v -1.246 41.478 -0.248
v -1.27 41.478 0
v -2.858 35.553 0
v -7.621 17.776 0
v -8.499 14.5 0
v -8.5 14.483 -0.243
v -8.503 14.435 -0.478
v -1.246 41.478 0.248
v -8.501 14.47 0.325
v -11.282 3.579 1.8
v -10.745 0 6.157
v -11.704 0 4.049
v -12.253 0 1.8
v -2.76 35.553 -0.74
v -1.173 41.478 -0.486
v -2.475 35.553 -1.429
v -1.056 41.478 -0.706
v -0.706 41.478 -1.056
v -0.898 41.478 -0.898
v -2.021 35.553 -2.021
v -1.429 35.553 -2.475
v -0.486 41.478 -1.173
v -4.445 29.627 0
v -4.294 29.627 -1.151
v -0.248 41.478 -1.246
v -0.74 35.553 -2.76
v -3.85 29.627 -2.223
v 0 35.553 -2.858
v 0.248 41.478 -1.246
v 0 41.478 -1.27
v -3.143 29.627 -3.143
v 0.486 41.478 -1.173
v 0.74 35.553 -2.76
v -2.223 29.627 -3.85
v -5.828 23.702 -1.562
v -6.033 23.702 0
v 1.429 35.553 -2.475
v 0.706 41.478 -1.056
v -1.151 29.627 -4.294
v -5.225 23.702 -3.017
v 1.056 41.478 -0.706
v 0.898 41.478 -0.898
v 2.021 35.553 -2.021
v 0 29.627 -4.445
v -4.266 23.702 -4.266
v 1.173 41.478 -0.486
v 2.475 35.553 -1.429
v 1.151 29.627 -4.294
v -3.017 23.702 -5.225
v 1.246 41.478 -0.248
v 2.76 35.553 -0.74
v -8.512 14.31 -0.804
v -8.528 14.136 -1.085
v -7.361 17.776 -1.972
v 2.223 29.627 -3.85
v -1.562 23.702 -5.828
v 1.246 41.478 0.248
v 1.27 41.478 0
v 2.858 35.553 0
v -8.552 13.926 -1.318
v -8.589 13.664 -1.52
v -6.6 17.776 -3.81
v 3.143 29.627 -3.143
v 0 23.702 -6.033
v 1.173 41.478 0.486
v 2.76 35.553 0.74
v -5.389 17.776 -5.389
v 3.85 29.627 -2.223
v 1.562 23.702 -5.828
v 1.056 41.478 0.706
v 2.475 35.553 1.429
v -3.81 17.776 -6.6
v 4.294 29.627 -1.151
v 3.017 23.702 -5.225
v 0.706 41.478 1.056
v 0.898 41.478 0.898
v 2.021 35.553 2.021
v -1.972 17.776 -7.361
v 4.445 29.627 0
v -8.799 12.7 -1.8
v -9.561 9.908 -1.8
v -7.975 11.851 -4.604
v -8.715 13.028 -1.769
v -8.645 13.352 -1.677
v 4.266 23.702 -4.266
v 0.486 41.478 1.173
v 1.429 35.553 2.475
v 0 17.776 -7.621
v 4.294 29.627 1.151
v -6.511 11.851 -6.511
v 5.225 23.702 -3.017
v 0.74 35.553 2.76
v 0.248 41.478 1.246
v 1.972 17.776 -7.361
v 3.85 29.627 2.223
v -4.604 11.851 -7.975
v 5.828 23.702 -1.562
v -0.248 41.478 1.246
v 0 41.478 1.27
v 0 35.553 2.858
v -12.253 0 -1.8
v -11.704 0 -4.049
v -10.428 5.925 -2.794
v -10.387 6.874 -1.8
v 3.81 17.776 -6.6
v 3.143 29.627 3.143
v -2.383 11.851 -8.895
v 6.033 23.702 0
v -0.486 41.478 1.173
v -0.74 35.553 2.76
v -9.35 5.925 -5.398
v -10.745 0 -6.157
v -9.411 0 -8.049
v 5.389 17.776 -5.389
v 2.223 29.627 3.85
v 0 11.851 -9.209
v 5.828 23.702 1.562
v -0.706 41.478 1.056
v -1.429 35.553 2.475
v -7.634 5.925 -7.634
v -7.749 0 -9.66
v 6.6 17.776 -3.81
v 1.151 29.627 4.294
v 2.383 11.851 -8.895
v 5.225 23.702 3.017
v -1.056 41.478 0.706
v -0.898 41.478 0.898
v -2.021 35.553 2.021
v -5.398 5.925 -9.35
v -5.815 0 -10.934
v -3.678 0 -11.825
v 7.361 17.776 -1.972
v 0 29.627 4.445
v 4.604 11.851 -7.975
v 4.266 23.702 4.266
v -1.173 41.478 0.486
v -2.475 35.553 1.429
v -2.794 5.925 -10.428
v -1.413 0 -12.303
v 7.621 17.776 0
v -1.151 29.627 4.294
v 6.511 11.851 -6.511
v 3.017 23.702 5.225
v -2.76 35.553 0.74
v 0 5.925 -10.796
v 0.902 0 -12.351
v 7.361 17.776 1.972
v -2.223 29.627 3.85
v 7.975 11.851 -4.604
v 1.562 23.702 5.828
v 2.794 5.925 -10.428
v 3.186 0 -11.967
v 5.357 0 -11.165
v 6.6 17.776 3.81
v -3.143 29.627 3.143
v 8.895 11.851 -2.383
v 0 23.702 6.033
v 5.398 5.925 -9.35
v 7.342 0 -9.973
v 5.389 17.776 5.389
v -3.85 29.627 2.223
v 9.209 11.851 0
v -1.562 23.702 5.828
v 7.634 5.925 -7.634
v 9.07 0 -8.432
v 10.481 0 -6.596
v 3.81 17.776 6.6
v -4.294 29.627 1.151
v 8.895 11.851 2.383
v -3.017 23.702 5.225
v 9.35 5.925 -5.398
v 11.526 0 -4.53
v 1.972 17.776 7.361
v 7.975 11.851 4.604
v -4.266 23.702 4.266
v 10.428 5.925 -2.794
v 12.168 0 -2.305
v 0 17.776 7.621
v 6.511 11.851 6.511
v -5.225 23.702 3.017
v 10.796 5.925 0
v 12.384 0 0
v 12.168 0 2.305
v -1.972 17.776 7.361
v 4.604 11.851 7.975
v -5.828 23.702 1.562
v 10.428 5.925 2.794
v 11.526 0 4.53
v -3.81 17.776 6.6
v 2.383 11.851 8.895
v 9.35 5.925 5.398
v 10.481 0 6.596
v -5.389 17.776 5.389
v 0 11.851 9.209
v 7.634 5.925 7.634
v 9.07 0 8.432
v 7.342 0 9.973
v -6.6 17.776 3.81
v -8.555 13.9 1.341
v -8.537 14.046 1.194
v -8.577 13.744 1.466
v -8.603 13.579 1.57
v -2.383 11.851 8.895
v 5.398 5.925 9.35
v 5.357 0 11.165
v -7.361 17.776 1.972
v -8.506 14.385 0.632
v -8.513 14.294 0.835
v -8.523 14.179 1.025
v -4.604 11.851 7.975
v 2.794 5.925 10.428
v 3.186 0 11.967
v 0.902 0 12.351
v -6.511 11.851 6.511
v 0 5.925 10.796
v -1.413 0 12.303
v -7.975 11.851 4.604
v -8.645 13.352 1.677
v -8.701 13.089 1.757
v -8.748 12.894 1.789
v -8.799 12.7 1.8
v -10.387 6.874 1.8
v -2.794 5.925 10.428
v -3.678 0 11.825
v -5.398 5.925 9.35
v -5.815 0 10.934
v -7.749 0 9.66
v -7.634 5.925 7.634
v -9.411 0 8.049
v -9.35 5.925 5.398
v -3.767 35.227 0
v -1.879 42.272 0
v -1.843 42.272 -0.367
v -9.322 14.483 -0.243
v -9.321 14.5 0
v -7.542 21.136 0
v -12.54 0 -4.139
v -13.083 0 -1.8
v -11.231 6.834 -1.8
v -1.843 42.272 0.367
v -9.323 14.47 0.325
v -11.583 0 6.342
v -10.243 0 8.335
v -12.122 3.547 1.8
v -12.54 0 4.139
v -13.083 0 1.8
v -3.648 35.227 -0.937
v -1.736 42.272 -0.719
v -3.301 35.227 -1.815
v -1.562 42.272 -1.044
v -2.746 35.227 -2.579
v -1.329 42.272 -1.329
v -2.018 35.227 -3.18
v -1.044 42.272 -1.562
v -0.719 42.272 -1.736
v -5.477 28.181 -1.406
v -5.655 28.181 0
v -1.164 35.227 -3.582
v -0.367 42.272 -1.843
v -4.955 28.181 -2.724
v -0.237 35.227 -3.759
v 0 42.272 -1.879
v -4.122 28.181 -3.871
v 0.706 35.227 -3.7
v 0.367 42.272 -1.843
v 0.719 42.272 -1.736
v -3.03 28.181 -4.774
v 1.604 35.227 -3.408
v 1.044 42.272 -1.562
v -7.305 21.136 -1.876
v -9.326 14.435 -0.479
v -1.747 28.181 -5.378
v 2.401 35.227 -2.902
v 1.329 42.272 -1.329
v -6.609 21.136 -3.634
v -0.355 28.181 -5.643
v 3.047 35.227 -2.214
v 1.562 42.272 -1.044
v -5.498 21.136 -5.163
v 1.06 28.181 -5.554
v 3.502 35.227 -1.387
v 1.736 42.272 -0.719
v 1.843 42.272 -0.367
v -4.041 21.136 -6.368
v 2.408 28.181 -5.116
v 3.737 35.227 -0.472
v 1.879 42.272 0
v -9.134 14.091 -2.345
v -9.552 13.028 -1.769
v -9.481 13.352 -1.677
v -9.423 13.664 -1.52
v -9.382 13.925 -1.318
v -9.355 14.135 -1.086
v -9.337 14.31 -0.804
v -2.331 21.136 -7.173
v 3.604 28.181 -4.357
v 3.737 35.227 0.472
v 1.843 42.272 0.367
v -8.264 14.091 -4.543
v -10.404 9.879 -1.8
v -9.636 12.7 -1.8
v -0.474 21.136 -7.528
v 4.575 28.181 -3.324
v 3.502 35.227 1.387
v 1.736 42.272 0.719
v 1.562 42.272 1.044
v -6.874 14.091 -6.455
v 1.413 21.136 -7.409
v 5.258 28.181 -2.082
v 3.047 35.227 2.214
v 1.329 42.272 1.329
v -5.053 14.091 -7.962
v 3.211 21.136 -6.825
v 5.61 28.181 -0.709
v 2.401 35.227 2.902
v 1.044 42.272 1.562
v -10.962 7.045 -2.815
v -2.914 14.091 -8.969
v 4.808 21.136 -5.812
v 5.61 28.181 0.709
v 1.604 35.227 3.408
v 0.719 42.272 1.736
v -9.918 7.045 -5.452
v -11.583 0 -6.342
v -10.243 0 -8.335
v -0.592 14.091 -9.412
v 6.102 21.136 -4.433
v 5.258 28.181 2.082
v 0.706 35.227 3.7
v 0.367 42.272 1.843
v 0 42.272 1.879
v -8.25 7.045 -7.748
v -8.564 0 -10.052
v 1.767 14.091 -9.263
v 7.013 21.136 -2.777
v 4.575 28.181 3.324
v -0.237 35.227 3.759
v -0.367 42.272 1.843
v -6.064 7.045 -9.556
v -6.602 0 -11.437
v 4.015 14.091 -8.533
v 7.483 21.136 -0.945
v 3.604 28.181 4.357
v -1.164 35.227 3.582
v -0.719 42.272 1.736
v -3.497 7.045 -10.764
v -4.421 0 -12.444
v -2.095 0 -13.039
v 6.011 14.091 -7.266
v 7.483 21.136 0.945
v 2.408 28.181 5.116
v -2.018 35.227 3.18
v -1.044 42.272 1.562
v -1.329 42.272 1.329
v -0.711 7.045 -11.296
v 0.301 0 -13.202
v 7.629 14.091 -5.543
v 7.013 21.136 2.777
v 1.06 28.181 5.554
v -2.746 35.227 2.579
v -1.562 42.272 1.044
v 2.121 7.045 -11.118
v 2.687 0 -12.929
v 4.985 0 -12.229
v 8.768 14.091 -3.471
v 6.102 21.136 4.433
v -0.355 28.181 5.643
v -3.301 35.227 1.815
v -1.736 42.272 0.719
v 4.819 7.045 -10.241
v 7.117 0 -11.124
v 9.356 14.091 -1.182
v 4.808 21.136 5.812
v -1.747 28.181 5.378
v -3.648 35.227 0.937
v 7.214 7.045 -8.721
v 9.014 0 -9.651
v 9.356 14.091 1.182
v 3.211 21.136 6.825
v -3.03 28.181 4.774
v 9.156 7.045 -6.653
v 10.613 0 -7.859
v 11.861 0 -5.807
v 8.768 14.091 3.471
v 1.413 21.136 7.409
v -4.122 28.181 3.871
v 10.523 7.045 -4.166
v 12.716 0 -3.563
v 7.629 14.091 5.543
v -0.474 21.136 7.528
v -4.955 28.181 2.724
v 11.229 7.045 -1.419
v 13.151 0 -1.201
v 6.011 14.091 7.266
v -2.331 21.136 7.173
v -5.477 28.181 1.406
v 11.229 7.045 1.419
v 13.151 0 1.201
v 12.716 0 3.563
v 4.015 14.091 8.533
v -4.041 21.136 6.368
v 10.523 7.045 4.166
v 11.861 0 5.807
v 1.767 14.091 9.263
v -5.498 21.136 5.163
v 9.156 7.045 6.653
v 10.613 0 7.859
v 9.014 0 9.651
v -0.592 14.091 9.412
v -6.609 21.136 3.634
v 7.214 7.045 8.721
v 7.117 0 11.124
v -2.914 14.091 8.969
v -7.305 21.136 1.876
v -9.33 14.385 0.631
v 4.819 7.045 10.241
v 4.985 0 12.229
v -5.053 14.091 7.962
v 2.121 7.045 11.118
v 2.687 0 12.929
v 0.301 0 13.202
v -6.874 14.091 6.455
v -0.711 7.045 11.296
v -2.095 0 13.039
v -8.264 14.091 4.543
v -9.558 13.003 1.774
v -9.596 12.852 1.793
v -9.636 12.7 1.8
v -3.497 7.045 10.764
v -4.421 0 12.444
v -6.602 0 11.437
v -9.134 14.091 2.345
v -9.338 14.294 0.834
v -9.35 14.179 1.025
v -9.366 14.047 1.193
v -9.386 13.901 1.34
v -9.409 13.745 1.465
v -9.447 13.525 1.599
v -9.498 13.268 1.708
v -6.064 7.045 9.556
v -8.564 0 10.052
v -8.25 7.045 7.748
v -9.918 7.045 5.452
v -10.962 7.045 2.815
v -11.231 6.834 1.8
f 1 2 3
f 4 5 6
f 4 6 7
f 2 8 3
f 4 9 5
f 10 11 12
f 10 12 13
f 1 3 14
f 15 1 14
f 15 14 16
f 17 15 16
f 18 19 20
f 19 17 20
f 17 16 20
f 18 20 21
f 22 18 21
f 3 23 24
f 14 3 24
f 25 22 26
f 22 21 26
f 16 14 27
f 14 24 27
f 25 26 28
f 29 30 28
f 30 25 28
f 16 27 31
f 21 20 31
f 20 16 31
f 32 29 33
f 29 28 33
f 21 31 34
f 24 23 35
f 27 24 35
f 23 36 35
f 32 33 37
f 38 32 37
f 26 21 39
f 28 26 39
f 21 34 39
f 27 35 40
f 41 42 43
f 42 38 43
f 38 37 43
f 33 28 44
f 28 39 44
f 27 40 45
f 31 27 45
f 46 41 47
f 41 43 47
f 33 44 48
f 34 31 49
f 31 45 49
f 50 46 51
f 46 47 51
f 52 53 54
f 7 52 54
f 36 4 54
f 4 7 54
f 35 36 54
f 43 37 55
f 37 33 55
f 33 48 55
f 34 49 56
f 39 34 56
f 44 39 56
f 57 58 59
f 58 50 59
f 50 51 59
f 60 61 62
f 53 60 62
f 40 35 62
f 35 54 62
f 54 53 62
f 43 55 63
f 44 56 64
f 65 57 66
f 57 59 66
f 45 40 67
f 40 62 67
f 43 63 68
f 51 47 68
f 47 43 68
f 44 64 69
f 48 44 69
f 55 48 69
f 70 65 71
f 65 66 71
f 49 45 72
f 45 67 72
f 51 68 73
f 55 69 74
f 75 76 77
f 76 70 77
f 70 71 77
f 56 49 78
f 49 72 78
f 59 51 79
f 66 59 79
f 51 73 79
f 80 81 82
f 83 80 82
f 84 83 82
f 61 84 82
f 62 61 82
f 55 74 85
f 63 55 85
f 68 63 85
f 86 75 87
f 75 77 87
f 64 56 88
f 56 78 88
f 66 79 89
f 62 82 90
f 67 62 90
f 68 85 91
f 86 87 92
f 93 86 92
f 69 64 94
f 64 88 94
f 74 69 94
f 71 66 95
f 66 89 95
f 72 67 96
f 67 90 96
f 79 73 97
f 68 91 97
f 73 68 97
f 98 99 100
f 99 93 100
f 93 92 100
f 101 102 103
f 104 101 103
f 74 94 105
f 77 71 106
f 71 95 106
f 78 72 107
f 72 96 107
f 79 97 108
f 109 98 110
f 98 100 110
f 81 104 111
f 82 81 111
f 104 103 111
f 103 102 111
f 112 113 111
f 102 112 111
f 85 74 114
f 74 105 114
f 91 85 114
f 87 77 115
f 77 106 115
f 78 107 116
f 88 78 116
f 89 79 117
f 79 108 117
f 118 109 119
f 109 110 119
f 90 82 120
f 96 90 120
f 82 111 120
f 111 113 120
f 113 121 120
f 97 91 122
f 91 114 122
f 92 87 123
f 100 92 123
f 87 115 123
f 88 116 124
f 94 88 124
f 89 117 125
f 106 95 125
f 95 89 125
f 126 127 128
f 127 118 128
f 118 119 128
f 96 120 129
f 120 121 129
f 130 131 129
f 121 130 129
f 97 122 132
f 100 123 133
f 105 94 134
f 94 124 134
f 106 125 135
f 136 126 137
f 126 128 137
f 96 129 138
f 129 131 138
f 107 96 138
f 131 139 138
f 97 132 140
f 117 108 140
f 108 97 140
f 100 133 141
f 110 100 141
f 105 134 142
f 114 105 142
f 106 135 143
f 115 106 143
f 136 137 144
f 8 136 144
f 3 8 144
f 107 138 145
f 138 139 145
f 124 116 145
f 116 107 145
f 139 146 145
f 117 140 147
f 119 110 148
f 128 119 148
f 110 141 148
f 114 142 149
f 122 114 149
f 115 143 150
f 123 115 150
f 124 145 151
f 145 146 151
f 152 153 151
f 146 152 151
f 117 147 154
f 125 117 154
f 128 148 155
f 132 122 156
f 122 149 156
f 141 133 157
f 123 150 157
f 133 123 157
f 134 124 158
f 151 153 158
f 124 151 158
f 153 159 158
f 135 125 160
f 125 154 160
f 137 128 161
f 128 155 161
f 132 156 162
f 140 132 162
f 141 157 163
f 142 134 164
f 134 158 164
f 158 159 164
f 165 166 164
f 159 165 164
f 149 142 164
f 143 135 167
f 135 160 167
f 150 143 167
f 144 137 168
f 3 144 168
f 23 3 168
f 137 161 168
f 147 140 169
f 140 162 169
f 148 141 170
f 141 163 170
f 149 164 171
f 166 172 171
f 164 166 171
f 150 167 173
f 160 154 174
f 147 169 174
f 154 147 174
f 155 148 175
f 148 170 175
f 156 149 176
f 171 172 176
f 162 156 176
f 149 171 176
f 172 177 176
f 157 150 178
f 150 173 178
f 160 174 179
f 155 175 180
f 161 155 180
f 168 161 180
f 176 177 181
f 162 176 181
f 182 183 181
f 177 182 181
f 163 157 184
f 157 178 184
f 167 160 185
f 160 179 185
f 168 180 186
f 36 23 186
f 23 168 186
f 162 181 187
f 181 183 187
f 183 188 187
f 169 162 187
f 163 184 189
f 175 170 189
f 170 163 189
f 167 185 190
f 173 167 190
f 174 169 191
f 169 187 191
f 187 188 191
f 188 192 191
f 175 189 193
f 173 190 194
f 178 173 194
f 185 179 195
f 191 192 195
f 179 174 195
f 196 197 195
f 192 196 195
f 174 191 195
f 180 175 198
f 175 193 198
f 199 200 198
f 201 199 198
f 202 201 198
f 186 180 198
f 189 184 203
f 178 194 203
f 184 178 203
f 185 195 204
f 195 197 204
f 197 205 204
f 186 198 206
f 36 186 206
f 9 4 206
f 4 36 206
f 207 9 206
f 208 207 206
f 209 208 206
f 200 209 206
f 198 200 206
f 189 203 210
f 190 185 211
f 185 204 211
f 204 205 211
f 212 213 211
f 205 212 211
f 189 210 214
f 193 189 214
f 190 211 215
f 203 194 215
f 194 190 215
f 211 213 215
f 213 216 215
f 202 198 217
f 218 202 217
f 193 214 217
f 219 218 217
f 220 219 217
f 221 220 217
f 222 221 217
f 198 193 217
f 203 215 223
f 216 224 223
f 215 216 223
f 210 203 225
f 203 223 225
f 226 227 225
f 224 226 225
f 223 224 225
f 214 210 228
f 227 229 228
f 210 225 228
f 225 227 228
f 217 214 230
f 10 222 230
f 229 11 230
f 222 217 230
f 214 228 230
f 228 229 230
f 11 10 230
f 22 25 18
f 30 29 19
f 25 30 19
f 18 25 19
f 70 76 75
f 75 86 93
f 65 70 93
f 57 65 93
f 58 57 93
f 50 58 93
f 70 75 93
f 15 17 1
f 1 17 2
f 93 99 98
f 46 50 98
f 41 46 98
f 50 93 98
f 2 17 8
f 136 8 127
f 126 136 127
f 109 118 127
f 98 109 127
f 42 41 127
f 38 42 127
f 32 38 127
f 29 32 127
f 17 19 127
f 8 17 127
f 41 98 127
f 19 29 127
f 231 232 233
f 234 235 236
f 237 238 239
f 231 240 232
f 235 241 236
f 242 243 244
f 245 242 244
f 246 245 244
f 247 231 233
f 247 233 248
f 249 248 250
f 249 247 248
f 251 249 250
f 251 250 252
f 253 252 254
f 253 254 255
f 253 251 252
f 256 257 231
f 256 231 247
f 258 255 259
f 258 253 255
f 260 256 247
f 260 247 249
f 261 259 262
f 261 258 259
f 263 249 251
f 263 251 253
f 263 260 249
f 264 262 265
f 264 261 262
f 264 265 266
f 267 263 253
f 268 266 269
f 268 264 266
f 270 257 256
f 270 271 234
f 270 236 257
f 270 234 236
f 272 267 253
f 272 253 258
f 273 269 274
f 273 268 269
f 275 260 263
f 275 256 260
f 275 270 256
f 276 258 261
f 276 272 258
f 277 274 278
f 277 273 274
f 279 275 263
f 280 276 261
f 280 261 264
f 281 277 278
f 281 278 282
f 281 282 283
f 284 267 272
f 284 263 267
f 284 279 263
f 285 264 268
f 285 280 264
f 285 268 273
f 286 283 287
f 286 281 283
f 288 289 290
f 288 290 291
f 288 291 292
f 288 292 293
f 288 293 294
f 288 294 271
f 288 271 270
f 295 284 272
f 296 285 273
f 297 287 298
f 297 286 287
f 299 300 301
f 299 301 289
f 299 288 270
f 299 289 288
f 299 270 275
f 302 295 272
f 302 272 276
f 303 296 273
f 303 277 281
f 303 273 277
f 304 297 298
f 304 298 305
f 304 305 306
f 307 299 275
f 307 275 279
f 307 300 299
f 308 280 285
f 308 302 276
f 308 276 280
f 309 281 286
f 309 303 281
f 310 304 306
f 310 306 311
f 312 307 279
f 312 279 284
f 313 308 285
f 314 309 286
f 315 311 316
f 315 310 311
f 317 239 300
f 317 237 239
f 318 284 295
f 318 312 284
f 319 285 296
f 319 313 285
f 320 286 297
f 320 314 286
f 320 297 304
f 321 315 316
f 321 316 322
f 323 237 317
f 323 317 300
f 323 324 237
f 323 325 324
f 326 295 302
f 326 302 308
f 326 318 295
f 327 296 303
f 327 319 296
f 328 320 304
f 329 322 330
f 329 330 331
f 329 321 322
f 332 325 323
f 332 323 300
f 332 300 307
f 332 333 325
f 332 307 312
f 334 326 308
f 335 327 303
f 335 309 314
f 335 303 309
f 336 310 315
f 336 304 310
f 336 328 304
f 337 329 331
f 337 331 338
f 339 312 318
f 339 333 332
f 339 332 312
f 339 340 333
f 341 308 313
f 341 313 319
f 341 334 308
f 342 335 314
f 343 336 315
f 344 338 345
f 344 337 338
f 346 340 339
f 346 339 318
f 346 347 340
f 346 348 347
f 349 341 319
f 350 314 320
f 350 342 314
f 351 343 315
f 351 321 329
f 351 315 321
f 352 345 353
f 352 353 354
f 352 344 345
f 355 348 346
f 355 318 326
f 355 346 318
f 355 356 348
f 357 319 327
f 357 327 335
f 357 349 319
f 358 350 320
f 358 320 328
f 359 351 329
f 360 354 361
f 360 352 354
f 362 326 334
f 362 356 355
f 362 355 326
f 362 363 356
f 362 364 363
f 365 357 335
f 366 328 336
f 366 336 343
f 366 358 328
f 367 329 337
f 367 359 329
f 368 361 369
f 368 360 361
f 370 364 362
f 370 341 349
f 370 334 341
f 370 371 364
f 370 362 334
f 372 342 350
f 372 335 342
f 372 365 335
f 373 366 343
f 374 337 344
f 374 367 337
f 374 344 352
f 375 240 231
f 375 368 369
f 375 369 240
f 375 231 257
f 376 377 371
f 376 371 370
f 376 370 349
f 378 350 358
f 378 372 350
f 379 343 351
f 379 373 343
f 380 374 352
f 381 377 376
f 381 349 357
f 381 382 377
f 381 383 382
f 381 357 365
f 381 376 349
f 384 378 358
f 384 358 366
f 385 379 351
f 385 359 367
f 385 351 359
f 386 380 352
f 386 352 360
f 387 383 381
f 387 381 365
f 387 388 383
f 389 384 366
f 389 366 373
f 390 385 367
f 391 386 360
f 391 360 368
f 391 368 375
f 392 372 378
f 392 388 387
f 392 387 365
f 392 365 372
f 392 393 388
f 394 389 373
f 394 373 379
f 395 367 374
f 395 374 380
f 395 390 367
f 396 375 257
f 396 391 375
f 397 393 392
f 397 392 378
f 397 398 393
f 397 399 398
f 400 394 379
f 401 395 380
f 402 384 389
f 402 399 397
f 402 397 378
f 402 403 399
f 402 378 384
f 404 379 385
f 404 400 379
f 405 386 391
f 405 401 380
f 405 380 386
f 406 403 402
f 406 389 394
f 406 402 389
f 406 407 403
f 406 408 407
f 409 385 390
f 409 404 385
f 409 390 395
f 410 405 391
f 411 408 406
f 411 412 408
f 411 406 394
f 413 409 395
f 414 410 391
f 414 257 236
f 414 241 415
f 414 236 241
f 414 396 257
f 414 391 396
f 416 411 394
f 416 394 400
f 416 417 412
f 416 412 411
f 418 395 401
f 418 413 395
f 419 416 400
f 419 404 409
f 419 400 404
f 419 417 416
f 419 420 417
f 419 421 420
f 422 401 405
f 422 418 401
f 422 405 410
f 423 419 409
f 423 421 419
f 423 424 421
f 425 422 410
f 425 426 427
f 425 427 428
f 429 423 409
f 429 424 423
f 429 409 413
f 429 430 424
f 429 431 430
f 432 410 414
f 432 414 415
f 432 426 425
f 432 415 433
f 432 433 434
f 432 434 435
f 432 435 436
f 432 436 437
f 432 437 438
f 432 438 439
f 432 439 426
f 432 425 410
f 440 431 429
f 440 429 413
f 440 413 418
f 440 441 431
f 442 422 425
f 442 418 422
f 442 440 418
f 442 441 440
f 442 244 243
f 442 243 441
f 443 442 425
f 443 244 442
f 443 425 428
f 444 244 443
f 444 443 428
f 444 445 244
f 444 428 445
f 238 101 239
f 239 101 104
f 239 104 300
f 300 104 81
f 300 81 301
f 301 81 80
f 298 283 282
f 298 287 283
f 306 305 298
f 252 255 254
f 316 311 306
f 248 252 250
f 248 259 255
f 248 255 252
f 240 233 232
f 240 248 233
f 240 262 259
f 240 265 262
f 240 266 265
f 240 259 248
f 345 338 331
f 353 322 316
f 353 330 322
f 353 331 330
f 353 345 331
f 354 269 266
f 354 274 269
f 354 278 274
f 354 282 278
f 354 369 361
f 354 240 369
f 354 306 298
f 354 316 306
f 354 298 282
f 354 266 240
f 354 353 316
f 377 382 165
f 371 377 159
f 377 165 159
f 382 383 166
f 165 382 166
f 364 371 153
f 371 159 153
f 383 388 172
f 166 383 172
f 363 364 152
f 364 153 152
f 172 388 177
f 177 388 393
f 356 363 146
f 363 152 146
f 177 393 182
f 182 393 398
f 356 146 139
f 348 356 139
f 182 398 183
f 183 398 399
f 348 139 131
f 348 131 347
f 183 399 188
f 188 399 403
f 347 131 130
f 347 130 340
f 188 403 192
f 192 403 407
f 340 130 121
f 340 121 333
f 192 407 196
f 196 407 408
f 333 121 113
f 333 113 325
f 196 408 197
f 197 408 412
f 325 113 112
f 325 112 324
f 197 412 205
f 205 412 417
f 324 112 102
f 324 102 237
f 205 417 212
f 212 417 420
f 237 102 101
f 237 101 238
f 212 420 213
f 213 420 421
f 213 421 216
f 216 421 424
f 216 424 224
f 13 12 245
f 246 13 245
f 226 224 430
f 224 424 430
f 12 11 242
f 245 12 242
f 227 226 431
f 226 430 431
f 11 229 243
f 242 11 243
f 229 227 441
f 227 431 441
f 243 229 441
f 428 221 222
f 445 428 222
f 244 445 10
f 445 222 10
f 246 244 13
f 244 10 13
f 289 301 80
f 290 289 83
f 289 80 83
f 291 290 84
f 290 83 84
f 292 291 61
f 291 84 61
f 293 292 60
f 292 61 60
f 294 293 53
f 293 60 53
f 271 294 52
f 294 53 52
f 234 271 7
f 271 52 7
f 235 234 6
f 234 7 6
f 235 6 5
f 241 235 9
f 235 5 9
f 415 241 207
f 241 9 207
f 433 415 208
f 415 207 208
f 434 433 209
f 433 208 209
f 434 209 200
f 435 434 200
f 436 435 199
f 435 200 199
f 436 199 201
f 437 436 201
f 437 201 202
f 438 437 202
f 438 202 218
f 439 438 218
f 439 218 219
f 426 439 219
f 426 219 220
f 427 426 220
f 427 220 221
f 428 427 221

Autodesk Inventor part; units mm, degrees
ref_plane "YZ Plane" through (0, 0, 0) normal (1, 0, 0) x (0, 1, 0)
ref_plane "XZ Plane" through (0, 0, 0) normal (0, 1, 0) x (-1, 0, 0)
ref_plane "XY Plane" through (0, 0, 0) normal (0, 0, 1) x (1, 0, 0)
sketch "Sketch1" plane through (0, 0, 0) normal (0, 0, 1) x (1, 0, 0)
  line L0 (0, 0) -> (0, 41.4782)
  line L1 (0, 41.4782) -> (-1.27, 41.4782)
  line L2 (-1.27, 41.4782) -> (-12.3841, 0)
  line L3 (-12.3841, 0) -> (0, 0)
  line L4 (0, -8.2956) -> (0, 49.7738) projected
  dimension "d0" = 1.27
  dimension "d1" = 75
  dimension "d2" = 41.4782
revolve "Revolution1" add sketch "Sketch1" angle 360 about axis through (0, -10, 0) along (0, 1, 0)
shell "Shell1" thickness 0.7937 outward yes removed faces 1 at (4.0081, 0, 0.9879)
sketch "Sketch2" plane through (0, 0, 0) normal (1, 0, 0) x (0, 1, 0)
  line L0 (0, 0) -> (12.7, 0) construction
  line L1 (0, -1.7996) -> (12.7, -1.7996)
  line L2 (12.7, 1.7996) -> (0, 1.7996)
  arc A0 (0, 1.7996) -> (0, -1.7996) centre (0, 0) ccw
  arc A1 (12.7, -1.7996) -> (12.7, 1.7996) centre (12.7, 0) ccw
  line L3 (0, -13.2058) -> (0, 13.2058) projected
  point P0 (6.35, 0)
  dimension "d7" = 1.7996
  dimension "d8" = 6.35
extrude "Extrusion1" cut sketch "Sketch2" against normal through all contours L3 L2 A1 L1
properties part number "CC-01" material "Steel, Galvanized"
